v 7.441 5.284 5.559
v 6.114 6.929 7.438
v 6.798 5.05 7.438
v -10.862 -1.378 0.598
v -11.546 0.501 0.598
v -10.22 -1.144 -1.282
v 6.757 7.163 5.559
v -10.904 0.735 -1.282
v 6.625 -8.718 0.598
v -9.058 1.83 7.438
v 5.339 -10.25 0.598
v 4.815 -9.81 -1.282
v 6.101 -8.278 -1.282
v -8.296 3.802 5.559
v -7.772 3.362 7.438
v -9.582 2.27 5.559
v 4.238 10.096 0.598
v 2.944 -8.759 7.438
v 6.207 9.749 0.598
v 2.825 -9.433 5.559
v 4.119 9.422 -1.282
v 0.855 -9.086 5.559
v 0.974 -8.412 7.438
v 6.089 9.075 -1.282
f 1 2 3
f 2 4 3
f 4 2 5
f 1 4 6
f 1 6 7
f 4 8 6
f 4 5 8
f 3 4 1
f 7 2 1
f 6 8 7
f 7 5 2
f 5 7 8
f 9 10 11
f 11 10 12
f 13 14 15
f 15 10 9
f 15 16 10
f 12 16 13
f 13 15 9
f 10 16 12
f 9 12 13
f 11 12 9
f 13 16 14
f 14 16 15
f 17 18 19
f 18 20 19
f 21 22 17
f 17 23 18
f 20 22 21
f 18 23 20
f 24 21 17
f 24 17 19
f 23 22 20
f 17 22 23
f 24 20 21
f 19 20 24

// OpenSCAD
for (a=[0:120:359])
{
    rotate([0, 0, a])
    translate([-10, 0, 0])
    rotate([20, 0, -70])
    translate([-1, -1, -1])
    cube([2, 20, 2]);
}
